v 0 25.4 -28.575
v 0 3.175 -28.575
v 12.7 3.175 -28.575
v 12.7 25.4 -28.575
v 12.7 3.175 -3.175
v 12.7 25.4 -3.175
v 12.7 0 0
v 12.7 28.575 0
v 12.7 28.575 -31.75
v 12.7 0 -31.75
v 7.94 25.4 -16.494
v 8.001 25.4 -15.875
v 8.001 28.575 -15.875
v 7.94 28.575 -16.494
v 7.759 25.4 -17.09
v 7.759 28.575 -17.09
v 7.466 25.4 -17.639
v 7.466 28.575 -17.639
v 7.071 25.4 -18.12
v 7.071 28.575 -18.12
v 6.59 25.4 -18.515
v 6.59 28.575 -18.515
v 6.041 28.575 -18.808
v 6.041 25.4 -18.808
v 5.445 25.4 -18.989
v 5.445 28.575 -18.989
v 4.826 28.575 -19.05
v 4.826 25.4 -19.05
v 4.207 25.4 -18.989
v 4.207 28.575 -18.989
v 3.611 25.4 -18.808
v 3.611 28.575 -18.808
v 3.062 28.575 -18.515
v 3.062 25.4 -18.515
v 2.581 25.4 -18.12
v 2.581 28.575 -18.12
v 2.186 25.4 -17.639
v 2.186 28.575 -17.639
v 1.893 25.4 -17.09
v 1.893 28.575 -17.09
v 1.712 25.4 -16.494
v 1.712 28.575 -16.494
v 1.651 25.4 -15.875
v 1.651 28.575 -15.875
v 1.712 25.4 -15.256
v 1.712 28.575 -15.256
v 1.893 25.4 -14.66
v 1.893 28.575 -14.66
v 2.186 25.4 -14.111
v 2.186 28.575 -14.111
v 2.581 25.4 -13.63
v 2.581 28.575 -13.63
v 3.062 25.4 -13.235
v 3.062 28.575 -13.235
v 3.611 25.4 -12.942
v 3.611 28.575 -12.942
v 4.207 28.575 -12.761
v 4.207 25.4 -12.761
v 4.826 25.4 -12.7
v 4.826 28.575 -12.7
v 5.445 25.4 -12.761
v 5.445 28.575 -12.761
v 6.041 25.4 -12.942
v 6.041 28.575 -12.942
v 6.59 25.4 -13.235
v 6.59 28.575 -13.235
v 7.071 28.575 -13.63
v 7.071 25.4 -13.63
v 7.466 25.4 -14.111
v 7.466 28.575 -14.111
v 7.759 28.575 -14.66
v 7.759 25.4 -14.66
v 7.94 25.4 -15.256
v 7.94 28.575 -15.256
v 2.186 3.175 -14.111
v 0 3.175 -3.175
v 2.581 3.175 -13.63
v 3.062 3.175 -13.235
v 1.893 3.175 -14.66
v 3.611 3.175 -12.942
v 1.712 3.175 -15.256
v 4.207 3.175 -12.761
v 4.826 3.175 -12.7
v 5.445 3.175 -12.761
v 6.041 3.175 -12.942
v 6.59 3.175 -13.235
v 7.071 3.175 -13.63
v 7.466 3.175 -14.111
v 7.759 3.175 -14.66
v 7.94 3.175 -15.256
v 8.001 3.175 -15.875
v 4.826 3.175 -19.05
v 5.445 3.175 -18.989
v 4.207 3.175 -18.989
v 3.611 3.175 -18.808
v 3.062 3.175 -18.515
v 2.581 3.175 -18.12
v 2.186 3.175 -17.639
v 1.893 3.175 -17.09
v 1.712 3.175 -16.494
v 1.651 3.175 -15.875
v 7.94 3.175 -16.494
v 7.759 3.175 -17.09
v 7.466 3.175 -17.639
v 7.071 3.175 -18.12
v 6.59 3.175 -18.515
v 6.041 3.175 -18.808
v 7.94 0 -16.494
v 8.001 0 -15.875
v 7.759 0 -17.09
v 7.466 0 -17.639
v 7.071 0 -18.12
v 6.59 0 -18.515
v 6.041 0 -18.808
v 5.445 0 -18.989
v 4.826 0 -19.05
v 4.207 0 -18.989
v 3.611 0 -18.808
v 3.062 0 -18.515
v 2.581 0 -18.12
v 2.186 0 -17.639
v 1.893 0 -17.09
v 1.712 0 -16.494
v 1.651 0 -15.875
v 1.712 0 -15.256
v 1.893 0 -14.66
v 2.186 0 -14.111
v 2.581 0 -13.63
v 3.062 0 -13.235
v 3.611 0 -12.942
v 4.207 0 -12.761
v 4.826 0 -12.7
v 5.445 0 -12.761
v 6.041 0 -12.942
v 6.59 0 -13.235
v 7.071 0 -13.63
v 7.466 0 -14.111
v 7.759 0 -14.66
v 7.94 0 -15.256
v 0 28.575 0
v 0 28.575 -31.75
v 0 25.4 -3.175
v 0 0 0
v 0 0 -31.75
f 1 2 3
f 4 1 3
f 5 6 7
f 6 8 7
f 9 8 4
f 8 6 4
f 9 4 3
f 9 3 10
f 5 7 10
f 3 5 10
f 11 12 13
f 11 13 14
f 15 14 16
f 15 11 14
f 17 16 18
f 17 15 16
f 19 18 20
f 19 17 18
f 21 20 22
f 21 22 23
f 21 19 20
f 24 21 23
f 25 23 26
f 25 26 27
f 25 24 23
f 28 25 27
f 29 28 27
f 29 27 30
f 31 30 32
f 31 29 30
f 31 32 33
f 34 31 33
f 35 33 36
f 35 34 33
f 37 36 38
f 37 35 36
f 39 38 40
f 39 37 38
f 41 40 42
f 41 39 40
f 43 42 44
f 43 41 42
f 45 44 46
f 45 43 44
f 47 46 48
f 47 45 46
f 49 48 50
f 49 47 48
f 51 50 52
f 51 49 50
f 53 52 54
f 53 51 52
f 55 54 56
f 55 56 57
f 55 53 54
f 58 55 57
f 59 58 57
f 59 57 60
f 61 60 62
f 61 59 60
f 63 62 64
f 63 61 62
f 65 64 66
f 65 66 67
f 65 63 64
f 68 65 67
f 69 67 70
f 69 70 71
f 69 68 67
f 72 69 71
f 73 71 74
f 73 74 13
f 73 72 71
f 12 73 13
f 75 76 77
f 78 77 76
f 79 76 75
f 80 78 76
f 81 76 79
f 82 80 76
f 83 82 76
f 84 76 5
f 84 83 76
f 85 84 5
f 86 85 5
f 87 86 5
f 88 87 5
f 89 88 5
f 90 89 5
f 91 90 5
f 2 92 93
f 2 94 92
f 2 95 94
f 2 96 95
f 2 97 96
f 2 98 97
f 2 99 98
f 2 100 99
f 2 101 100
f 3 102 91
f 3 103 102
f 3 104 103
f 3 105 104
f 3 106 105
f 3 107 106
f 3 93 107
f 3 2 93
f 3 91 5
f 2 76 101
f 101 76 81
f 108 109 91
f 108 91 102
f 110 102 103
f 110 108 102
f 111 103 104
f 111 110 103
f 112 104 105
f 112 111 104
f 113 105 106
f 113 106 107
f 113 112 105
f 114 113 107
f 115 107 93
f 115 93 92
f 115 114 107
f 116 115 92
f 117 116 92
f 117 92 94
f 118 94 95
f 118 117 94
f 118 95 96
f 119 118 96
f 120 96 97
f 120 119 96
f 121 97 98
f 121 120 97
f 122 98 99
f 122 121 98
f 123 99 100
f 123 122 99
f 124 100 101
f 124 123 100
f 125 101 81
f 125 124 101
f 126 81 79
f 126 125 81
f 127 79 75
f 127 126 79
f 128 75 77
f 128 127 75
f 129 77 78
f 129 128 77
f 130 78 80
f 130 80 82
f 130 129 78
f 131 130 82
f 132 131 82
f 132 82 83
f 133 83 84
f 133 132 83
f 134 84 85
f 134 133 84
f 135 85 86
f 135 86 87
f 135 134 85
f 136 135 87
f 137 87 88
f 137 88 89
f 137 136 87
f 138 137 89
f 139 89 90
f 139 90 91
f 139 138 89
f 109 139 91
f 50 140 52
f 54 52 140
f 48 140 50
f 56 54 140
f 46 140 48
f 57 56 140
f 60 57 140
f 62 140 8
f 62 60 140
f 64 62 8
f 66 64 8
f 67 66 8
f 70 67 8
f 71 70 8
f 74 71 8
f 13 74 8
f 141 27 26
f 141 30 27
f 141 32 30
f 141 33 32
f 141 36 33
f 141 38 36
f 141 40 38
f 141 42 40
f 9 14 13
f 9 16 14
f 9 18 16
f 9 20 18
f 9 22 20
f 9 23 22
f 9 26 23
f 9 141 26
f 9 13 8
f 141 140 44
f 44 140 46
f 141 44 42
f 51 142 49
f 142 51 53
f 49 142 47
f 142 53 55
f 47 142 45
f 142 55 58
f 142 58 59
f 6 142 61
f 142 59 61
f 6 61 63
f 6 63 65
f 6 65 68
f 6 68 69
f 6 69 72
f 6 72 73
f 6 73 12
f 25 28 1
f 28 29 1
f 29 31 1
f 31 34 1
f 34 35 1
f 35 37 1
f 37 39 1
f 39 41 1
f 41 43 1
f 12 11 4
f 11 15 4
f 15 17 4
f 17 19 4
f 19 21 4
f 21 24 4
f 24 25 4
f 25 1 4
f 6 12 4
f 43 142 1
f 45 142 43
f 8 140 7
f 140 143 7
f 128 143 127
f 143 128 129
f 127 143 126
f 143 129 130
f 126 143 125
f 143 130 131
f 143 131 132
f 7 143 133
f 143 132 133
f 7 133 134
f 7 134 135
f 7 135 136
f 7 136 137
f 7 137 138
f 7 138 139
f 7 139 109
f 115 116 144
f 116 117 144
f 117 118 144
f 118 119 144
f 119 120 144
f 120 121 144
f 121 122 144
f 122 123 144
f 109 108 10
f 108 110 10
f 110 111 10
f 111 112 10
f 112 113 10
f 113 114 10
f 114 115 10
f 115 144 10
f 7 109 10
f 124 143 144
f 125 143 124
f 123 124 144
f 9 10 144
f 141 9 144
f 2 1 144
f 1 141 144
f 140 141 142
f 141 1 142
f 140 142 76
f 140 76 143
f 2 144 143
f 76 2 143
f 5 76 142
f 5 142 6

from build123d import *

# Parameters (mm, degrees)
SKETCH1_W           = 12.7
SKETCH1_H           = 31.75
SKETCH1_R           = 3.175
BOSS_EXTRUDE2_DEPTH = 3.175
SKETCH2_W           = 12.7
SKETCH2_H           = 3.175
BOSS_EXTRUDE4_DEPTH = 22.225
SKETCH3_R           = 3.175
BOSS_EXTRUDE5_DEPTH = 3.175


with BuildPart() as part:
    # Sketch1 → Boss-Extrude2 (new body)
    with BuildSketch(Plane(origin=(0, 0, 0), x_dir=(1, 0, 0), z_dir=(0, 1, 0))):
        with Locations((6.35, 15.875)):
            Rectangle(SKETCH1_W, SKETCH1_H)
        with Locations((4.826, 15.875)):
            Circle(SKETCH1_R, mode=Mode.SUBTRACT)
    extrude(amount=BOSS_EXTRUDE2_DEPTH)

    # Sketch2 → Boss-Extrude4 (add)
    with BuildSketch(Plane(origin=(0, 3.175, 0), x_dir=(1, 0, 0), z_dir=(0, 1, 0))):
        Polygon((12.7, 31.75), (0, 31.75), (0, 28.575), (11.684, 28.575), (12.7, 28.575), align=None)
        with Locations((6.35, 1.5875)):
            Rectangle(SKETCH2_W, SKETCH2_H)
    extrude(amount=BOSS_EXTRUDE4_DEPTH)

    # Sketch3 → Boss-Extrude5 (add)
    with BuildSketch(Plane(origin=(0, 25.4, 0), x_dir=(1, 0, 0), z_dir=(0, 1, 0))):
        Polygon((12.7, 28.575), (12.7, 31.75), (0, 31.75), (0, 28.575), (0, 3.175), (0, 0), (12.7, 0), (12.7, 3.175), align=None)
        with Locations((4.826, 15.875)):
            Circle(SKETCH3_R, mode=Mode.SUBTRACT)
    extrude(amount=BOSS_EXTRUDE5_DEPTH)


solid = part.part
